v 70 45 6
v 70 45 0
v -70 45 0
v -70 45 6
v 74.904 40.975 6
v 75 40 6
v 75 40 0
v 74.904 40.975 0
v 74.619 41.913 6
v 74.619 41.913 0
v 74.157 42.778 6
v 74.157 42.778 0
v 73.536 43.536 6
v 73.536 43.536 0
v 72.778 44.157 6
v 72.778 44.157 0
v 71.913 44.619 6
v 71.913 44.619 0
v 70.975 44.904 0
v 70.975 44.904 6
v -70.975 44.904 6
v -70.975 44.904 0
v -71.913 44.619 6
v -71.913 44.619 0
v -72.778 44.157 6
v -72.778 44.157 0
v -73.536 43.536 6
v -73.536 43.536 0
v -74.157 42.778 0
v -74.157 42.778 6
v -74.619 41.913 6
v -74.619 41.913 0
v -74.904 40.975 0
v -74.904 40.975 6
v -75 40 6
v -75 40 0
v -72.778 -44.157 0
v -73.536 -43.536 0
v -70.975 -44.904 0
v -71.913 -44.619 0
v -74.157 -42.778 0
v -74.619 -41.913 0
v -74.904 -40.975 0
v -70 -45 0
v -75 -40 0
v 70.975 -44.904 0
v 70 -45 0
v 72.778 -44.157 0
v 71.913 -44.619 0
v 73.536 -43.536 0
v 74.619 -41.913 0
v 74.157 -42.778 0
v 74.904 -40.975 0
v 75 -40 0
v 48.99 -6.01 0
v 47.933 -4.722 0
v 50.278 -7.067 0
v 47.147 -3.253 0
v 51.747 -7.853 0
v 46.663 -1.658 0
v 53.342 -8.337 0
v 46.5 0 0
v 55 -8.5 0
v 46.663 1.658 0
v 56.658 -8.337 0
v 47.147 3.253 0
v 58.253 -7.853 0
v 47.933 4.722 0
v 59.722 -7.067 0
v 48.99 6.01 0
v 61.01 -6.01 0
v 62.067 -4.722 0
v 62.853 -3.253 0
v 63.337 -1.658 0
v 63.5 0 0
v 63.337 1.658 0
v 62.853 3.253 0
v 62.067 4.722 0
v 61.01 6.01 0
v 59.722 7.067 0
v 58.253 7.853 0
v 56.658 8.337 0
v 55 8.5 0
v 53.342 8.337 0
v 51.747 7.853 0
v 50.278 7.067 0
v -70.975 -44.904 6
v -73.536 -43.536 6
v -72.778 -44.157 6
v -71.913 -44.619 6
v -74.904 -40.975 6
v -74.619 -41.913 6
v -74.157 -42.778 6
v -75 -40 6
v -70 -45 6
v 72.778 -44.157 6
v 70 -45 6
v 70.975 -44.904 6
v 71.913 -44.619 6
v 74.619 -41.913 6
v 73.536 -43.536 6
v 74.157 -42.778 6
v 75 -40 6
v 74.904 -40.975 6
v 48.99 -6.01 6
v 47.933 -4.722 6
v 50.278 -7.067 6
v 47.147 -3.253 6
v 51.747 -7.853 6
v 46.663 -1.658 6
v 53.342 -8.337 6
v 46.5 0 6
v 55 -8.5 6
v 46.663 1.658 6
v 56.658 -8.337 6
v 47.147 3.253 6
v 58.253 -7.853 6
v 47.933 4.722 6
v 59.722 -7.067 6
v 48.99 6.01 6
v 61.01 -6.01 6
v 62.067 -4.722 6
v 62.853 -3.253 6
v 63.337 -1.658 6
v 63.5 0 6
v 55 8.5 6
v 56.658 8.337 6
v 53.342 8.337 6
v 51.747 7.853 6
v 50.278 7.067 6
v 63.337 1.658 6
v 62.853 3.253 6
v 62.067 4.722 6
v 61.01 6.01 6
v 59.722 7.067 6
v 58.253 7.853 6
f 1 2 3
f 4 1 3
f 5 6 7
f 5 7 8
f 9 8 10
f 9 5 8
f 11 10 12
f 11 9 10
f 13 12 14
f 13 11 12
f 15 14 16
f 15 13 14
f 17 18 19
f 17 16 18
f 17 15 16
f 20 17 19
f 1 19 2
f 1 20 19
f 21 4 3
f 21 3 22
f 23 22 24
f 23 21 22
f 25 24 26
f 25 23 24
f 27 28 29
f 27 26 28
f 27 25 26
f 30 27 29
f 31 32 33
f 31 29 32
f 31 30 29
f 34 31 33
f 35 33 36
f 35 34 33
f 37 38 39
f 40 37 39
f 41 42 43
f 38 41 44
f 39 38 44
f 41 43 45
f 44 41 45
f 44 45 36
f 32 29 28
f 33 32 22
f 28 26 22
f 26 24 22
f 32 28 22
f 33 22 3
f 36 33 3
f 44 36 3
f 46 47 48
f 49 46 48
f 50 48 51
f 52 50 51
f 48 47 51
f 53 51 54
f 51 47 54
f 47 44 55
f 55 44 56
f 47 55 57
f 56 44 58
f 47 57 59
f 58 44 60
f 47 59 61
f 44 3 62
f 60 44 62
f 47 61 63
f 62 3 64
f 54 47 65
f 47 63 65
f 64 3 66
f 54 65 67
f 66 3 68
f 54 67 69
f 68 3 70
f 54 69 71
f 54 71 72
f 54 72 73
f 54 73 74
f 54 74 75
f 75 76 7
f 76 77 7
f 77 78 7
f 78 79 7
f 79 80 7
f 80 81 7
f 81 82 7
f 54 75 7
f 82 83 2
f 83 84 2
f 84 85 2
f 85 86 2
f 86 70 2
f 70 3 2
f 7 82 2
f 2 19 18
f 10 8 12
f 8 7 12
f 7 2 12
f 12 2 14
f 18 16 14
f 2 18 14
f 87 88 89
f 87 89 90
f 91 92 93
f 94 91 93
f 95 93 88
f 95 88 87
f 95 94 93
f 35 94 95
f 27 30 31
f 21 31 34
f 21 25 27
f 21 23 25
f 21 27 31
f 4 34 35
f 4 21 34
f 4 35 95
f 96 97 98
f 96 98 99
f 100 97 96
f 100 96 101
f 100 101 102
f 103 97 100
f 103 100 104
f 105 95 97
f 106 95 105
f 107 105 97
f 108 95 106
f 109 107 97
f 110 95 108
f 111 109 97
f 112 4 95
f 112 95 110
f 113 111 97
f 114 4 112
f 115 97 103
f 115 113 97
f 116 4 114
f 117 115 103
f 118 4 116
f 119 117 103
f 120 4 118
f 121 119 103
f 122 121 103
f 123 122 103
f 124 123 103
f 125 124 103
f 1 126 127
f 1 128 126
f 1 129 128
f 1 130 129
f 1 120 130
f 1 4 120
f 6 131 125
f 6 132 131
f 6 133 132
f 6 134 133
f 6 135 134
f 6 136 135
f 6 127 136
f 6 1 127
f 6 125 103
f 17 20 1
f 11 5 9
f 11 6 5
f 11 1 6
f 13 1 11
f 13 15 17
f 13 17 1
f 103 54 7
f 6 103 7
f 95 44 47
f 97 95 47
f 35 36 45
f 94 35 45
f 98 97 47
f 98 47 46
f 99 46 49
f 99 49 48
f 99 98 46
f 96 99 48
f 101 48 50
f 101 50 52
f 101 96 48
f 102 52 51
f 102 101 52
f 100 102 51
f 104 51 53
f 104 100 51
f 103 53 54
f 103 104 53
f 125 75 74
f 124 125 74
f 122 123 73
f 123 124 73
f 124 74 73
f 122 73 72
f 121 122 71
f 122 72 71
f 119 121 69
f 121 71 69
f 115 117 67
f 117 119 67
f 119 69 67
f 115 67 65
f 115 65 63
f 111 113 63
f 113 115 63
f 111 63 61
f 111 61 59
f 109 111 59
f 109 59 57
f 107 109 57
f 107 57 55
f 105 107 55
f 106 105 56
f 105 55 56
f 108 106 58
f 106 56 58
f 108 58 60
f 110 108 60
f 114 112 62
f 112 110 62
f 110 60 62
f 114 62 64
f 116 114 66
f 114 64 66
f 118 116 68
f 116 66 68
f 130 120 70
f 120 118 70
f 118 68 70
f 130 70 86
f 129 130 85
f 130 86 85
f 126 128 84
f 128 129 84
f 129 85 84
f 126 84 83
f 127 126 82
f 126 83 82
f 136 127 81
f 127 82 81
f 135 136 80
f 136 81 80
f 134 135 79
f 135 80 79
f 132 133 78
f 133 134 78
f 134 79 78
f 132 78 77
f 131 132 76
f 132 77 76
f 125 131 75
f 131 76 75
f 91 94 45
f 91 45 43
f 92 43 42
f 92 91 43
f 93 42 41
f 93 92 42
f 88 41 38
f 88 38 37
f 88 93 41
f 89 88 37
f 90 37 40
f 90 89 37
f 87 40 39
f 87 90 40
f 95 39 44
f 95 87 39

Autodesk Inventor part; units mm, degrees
ref_plane "YZ Plane" through (0, 0, 0) normal (1, 0, 0) x (0, 1, 0)
ref_plane "XZ Plane" through (0, 0, 0) normal (0, 1, 0) x (-1, 0, 0)
ref_plane "XY Plane" through (0, 0, 0) normal (0, 0, 1) x (1, 0, 0)
sketch "Sketch1" plane through (0, 0, 0) normal (0, 0, 1) x (1, 0, 0)
  line L0 (-75, -45) -> (75, -45)
  line L1 (75, -45) -> (75, 45)
  line L2 (75, 45) -> (-75, 45)
  line L3 (-75, 45) -> (-75, -45)
  line L4 (-75, -45) -> (75, 45) construction
  line L5 (75, -45) -> (-75, 45) construction
  circle A0 centre (55, -25) radius 8.5
  circle A1 centre (55, 25) radius 8.5
  line L6 (0, 0) -> (75, 0) construction
  circle A2 centre (55, 0) radius 8.5
  dimension "d0" = 150
  dimension "d1" = 90
  dimension "d23" = 17
  dimension "d25" = 20
  dimension "d26" = 20
extrude "Plate1" add sketch "Sketch1" along normal blind 6 contours L3 L2 L1 L0 | A0 | A1
fillet "Corner Round2" radius 5 4 edges at (-75, 45, 3) (-75, -45, 3) (75, -45, 3) (75, 45, 3)
equation "\"d26\" = d25"
equation "\"d2\" = Thickness"
equation "\"BendReliefWidth\" = Thickness"
equation "\"BendReliefDepth\" = 0.5 * Thickness"
equation "\"CornerReliefSize\" = 4 * Thickness"
equation "\"MinimumRemnant\" = 2 * Thickness"
equation "\"TransitionRadius\" = BendRadius"
equation "\"JacobiRadiusSize\" = BendRadius"
equation "\"GapSize\" = Thickness"
equation "\"Thickness\" = 6"
equation "\"BendRadius\" = 5"
properties part number "PRS 1200-94 leg floor plate" material "Stainless Steel"
